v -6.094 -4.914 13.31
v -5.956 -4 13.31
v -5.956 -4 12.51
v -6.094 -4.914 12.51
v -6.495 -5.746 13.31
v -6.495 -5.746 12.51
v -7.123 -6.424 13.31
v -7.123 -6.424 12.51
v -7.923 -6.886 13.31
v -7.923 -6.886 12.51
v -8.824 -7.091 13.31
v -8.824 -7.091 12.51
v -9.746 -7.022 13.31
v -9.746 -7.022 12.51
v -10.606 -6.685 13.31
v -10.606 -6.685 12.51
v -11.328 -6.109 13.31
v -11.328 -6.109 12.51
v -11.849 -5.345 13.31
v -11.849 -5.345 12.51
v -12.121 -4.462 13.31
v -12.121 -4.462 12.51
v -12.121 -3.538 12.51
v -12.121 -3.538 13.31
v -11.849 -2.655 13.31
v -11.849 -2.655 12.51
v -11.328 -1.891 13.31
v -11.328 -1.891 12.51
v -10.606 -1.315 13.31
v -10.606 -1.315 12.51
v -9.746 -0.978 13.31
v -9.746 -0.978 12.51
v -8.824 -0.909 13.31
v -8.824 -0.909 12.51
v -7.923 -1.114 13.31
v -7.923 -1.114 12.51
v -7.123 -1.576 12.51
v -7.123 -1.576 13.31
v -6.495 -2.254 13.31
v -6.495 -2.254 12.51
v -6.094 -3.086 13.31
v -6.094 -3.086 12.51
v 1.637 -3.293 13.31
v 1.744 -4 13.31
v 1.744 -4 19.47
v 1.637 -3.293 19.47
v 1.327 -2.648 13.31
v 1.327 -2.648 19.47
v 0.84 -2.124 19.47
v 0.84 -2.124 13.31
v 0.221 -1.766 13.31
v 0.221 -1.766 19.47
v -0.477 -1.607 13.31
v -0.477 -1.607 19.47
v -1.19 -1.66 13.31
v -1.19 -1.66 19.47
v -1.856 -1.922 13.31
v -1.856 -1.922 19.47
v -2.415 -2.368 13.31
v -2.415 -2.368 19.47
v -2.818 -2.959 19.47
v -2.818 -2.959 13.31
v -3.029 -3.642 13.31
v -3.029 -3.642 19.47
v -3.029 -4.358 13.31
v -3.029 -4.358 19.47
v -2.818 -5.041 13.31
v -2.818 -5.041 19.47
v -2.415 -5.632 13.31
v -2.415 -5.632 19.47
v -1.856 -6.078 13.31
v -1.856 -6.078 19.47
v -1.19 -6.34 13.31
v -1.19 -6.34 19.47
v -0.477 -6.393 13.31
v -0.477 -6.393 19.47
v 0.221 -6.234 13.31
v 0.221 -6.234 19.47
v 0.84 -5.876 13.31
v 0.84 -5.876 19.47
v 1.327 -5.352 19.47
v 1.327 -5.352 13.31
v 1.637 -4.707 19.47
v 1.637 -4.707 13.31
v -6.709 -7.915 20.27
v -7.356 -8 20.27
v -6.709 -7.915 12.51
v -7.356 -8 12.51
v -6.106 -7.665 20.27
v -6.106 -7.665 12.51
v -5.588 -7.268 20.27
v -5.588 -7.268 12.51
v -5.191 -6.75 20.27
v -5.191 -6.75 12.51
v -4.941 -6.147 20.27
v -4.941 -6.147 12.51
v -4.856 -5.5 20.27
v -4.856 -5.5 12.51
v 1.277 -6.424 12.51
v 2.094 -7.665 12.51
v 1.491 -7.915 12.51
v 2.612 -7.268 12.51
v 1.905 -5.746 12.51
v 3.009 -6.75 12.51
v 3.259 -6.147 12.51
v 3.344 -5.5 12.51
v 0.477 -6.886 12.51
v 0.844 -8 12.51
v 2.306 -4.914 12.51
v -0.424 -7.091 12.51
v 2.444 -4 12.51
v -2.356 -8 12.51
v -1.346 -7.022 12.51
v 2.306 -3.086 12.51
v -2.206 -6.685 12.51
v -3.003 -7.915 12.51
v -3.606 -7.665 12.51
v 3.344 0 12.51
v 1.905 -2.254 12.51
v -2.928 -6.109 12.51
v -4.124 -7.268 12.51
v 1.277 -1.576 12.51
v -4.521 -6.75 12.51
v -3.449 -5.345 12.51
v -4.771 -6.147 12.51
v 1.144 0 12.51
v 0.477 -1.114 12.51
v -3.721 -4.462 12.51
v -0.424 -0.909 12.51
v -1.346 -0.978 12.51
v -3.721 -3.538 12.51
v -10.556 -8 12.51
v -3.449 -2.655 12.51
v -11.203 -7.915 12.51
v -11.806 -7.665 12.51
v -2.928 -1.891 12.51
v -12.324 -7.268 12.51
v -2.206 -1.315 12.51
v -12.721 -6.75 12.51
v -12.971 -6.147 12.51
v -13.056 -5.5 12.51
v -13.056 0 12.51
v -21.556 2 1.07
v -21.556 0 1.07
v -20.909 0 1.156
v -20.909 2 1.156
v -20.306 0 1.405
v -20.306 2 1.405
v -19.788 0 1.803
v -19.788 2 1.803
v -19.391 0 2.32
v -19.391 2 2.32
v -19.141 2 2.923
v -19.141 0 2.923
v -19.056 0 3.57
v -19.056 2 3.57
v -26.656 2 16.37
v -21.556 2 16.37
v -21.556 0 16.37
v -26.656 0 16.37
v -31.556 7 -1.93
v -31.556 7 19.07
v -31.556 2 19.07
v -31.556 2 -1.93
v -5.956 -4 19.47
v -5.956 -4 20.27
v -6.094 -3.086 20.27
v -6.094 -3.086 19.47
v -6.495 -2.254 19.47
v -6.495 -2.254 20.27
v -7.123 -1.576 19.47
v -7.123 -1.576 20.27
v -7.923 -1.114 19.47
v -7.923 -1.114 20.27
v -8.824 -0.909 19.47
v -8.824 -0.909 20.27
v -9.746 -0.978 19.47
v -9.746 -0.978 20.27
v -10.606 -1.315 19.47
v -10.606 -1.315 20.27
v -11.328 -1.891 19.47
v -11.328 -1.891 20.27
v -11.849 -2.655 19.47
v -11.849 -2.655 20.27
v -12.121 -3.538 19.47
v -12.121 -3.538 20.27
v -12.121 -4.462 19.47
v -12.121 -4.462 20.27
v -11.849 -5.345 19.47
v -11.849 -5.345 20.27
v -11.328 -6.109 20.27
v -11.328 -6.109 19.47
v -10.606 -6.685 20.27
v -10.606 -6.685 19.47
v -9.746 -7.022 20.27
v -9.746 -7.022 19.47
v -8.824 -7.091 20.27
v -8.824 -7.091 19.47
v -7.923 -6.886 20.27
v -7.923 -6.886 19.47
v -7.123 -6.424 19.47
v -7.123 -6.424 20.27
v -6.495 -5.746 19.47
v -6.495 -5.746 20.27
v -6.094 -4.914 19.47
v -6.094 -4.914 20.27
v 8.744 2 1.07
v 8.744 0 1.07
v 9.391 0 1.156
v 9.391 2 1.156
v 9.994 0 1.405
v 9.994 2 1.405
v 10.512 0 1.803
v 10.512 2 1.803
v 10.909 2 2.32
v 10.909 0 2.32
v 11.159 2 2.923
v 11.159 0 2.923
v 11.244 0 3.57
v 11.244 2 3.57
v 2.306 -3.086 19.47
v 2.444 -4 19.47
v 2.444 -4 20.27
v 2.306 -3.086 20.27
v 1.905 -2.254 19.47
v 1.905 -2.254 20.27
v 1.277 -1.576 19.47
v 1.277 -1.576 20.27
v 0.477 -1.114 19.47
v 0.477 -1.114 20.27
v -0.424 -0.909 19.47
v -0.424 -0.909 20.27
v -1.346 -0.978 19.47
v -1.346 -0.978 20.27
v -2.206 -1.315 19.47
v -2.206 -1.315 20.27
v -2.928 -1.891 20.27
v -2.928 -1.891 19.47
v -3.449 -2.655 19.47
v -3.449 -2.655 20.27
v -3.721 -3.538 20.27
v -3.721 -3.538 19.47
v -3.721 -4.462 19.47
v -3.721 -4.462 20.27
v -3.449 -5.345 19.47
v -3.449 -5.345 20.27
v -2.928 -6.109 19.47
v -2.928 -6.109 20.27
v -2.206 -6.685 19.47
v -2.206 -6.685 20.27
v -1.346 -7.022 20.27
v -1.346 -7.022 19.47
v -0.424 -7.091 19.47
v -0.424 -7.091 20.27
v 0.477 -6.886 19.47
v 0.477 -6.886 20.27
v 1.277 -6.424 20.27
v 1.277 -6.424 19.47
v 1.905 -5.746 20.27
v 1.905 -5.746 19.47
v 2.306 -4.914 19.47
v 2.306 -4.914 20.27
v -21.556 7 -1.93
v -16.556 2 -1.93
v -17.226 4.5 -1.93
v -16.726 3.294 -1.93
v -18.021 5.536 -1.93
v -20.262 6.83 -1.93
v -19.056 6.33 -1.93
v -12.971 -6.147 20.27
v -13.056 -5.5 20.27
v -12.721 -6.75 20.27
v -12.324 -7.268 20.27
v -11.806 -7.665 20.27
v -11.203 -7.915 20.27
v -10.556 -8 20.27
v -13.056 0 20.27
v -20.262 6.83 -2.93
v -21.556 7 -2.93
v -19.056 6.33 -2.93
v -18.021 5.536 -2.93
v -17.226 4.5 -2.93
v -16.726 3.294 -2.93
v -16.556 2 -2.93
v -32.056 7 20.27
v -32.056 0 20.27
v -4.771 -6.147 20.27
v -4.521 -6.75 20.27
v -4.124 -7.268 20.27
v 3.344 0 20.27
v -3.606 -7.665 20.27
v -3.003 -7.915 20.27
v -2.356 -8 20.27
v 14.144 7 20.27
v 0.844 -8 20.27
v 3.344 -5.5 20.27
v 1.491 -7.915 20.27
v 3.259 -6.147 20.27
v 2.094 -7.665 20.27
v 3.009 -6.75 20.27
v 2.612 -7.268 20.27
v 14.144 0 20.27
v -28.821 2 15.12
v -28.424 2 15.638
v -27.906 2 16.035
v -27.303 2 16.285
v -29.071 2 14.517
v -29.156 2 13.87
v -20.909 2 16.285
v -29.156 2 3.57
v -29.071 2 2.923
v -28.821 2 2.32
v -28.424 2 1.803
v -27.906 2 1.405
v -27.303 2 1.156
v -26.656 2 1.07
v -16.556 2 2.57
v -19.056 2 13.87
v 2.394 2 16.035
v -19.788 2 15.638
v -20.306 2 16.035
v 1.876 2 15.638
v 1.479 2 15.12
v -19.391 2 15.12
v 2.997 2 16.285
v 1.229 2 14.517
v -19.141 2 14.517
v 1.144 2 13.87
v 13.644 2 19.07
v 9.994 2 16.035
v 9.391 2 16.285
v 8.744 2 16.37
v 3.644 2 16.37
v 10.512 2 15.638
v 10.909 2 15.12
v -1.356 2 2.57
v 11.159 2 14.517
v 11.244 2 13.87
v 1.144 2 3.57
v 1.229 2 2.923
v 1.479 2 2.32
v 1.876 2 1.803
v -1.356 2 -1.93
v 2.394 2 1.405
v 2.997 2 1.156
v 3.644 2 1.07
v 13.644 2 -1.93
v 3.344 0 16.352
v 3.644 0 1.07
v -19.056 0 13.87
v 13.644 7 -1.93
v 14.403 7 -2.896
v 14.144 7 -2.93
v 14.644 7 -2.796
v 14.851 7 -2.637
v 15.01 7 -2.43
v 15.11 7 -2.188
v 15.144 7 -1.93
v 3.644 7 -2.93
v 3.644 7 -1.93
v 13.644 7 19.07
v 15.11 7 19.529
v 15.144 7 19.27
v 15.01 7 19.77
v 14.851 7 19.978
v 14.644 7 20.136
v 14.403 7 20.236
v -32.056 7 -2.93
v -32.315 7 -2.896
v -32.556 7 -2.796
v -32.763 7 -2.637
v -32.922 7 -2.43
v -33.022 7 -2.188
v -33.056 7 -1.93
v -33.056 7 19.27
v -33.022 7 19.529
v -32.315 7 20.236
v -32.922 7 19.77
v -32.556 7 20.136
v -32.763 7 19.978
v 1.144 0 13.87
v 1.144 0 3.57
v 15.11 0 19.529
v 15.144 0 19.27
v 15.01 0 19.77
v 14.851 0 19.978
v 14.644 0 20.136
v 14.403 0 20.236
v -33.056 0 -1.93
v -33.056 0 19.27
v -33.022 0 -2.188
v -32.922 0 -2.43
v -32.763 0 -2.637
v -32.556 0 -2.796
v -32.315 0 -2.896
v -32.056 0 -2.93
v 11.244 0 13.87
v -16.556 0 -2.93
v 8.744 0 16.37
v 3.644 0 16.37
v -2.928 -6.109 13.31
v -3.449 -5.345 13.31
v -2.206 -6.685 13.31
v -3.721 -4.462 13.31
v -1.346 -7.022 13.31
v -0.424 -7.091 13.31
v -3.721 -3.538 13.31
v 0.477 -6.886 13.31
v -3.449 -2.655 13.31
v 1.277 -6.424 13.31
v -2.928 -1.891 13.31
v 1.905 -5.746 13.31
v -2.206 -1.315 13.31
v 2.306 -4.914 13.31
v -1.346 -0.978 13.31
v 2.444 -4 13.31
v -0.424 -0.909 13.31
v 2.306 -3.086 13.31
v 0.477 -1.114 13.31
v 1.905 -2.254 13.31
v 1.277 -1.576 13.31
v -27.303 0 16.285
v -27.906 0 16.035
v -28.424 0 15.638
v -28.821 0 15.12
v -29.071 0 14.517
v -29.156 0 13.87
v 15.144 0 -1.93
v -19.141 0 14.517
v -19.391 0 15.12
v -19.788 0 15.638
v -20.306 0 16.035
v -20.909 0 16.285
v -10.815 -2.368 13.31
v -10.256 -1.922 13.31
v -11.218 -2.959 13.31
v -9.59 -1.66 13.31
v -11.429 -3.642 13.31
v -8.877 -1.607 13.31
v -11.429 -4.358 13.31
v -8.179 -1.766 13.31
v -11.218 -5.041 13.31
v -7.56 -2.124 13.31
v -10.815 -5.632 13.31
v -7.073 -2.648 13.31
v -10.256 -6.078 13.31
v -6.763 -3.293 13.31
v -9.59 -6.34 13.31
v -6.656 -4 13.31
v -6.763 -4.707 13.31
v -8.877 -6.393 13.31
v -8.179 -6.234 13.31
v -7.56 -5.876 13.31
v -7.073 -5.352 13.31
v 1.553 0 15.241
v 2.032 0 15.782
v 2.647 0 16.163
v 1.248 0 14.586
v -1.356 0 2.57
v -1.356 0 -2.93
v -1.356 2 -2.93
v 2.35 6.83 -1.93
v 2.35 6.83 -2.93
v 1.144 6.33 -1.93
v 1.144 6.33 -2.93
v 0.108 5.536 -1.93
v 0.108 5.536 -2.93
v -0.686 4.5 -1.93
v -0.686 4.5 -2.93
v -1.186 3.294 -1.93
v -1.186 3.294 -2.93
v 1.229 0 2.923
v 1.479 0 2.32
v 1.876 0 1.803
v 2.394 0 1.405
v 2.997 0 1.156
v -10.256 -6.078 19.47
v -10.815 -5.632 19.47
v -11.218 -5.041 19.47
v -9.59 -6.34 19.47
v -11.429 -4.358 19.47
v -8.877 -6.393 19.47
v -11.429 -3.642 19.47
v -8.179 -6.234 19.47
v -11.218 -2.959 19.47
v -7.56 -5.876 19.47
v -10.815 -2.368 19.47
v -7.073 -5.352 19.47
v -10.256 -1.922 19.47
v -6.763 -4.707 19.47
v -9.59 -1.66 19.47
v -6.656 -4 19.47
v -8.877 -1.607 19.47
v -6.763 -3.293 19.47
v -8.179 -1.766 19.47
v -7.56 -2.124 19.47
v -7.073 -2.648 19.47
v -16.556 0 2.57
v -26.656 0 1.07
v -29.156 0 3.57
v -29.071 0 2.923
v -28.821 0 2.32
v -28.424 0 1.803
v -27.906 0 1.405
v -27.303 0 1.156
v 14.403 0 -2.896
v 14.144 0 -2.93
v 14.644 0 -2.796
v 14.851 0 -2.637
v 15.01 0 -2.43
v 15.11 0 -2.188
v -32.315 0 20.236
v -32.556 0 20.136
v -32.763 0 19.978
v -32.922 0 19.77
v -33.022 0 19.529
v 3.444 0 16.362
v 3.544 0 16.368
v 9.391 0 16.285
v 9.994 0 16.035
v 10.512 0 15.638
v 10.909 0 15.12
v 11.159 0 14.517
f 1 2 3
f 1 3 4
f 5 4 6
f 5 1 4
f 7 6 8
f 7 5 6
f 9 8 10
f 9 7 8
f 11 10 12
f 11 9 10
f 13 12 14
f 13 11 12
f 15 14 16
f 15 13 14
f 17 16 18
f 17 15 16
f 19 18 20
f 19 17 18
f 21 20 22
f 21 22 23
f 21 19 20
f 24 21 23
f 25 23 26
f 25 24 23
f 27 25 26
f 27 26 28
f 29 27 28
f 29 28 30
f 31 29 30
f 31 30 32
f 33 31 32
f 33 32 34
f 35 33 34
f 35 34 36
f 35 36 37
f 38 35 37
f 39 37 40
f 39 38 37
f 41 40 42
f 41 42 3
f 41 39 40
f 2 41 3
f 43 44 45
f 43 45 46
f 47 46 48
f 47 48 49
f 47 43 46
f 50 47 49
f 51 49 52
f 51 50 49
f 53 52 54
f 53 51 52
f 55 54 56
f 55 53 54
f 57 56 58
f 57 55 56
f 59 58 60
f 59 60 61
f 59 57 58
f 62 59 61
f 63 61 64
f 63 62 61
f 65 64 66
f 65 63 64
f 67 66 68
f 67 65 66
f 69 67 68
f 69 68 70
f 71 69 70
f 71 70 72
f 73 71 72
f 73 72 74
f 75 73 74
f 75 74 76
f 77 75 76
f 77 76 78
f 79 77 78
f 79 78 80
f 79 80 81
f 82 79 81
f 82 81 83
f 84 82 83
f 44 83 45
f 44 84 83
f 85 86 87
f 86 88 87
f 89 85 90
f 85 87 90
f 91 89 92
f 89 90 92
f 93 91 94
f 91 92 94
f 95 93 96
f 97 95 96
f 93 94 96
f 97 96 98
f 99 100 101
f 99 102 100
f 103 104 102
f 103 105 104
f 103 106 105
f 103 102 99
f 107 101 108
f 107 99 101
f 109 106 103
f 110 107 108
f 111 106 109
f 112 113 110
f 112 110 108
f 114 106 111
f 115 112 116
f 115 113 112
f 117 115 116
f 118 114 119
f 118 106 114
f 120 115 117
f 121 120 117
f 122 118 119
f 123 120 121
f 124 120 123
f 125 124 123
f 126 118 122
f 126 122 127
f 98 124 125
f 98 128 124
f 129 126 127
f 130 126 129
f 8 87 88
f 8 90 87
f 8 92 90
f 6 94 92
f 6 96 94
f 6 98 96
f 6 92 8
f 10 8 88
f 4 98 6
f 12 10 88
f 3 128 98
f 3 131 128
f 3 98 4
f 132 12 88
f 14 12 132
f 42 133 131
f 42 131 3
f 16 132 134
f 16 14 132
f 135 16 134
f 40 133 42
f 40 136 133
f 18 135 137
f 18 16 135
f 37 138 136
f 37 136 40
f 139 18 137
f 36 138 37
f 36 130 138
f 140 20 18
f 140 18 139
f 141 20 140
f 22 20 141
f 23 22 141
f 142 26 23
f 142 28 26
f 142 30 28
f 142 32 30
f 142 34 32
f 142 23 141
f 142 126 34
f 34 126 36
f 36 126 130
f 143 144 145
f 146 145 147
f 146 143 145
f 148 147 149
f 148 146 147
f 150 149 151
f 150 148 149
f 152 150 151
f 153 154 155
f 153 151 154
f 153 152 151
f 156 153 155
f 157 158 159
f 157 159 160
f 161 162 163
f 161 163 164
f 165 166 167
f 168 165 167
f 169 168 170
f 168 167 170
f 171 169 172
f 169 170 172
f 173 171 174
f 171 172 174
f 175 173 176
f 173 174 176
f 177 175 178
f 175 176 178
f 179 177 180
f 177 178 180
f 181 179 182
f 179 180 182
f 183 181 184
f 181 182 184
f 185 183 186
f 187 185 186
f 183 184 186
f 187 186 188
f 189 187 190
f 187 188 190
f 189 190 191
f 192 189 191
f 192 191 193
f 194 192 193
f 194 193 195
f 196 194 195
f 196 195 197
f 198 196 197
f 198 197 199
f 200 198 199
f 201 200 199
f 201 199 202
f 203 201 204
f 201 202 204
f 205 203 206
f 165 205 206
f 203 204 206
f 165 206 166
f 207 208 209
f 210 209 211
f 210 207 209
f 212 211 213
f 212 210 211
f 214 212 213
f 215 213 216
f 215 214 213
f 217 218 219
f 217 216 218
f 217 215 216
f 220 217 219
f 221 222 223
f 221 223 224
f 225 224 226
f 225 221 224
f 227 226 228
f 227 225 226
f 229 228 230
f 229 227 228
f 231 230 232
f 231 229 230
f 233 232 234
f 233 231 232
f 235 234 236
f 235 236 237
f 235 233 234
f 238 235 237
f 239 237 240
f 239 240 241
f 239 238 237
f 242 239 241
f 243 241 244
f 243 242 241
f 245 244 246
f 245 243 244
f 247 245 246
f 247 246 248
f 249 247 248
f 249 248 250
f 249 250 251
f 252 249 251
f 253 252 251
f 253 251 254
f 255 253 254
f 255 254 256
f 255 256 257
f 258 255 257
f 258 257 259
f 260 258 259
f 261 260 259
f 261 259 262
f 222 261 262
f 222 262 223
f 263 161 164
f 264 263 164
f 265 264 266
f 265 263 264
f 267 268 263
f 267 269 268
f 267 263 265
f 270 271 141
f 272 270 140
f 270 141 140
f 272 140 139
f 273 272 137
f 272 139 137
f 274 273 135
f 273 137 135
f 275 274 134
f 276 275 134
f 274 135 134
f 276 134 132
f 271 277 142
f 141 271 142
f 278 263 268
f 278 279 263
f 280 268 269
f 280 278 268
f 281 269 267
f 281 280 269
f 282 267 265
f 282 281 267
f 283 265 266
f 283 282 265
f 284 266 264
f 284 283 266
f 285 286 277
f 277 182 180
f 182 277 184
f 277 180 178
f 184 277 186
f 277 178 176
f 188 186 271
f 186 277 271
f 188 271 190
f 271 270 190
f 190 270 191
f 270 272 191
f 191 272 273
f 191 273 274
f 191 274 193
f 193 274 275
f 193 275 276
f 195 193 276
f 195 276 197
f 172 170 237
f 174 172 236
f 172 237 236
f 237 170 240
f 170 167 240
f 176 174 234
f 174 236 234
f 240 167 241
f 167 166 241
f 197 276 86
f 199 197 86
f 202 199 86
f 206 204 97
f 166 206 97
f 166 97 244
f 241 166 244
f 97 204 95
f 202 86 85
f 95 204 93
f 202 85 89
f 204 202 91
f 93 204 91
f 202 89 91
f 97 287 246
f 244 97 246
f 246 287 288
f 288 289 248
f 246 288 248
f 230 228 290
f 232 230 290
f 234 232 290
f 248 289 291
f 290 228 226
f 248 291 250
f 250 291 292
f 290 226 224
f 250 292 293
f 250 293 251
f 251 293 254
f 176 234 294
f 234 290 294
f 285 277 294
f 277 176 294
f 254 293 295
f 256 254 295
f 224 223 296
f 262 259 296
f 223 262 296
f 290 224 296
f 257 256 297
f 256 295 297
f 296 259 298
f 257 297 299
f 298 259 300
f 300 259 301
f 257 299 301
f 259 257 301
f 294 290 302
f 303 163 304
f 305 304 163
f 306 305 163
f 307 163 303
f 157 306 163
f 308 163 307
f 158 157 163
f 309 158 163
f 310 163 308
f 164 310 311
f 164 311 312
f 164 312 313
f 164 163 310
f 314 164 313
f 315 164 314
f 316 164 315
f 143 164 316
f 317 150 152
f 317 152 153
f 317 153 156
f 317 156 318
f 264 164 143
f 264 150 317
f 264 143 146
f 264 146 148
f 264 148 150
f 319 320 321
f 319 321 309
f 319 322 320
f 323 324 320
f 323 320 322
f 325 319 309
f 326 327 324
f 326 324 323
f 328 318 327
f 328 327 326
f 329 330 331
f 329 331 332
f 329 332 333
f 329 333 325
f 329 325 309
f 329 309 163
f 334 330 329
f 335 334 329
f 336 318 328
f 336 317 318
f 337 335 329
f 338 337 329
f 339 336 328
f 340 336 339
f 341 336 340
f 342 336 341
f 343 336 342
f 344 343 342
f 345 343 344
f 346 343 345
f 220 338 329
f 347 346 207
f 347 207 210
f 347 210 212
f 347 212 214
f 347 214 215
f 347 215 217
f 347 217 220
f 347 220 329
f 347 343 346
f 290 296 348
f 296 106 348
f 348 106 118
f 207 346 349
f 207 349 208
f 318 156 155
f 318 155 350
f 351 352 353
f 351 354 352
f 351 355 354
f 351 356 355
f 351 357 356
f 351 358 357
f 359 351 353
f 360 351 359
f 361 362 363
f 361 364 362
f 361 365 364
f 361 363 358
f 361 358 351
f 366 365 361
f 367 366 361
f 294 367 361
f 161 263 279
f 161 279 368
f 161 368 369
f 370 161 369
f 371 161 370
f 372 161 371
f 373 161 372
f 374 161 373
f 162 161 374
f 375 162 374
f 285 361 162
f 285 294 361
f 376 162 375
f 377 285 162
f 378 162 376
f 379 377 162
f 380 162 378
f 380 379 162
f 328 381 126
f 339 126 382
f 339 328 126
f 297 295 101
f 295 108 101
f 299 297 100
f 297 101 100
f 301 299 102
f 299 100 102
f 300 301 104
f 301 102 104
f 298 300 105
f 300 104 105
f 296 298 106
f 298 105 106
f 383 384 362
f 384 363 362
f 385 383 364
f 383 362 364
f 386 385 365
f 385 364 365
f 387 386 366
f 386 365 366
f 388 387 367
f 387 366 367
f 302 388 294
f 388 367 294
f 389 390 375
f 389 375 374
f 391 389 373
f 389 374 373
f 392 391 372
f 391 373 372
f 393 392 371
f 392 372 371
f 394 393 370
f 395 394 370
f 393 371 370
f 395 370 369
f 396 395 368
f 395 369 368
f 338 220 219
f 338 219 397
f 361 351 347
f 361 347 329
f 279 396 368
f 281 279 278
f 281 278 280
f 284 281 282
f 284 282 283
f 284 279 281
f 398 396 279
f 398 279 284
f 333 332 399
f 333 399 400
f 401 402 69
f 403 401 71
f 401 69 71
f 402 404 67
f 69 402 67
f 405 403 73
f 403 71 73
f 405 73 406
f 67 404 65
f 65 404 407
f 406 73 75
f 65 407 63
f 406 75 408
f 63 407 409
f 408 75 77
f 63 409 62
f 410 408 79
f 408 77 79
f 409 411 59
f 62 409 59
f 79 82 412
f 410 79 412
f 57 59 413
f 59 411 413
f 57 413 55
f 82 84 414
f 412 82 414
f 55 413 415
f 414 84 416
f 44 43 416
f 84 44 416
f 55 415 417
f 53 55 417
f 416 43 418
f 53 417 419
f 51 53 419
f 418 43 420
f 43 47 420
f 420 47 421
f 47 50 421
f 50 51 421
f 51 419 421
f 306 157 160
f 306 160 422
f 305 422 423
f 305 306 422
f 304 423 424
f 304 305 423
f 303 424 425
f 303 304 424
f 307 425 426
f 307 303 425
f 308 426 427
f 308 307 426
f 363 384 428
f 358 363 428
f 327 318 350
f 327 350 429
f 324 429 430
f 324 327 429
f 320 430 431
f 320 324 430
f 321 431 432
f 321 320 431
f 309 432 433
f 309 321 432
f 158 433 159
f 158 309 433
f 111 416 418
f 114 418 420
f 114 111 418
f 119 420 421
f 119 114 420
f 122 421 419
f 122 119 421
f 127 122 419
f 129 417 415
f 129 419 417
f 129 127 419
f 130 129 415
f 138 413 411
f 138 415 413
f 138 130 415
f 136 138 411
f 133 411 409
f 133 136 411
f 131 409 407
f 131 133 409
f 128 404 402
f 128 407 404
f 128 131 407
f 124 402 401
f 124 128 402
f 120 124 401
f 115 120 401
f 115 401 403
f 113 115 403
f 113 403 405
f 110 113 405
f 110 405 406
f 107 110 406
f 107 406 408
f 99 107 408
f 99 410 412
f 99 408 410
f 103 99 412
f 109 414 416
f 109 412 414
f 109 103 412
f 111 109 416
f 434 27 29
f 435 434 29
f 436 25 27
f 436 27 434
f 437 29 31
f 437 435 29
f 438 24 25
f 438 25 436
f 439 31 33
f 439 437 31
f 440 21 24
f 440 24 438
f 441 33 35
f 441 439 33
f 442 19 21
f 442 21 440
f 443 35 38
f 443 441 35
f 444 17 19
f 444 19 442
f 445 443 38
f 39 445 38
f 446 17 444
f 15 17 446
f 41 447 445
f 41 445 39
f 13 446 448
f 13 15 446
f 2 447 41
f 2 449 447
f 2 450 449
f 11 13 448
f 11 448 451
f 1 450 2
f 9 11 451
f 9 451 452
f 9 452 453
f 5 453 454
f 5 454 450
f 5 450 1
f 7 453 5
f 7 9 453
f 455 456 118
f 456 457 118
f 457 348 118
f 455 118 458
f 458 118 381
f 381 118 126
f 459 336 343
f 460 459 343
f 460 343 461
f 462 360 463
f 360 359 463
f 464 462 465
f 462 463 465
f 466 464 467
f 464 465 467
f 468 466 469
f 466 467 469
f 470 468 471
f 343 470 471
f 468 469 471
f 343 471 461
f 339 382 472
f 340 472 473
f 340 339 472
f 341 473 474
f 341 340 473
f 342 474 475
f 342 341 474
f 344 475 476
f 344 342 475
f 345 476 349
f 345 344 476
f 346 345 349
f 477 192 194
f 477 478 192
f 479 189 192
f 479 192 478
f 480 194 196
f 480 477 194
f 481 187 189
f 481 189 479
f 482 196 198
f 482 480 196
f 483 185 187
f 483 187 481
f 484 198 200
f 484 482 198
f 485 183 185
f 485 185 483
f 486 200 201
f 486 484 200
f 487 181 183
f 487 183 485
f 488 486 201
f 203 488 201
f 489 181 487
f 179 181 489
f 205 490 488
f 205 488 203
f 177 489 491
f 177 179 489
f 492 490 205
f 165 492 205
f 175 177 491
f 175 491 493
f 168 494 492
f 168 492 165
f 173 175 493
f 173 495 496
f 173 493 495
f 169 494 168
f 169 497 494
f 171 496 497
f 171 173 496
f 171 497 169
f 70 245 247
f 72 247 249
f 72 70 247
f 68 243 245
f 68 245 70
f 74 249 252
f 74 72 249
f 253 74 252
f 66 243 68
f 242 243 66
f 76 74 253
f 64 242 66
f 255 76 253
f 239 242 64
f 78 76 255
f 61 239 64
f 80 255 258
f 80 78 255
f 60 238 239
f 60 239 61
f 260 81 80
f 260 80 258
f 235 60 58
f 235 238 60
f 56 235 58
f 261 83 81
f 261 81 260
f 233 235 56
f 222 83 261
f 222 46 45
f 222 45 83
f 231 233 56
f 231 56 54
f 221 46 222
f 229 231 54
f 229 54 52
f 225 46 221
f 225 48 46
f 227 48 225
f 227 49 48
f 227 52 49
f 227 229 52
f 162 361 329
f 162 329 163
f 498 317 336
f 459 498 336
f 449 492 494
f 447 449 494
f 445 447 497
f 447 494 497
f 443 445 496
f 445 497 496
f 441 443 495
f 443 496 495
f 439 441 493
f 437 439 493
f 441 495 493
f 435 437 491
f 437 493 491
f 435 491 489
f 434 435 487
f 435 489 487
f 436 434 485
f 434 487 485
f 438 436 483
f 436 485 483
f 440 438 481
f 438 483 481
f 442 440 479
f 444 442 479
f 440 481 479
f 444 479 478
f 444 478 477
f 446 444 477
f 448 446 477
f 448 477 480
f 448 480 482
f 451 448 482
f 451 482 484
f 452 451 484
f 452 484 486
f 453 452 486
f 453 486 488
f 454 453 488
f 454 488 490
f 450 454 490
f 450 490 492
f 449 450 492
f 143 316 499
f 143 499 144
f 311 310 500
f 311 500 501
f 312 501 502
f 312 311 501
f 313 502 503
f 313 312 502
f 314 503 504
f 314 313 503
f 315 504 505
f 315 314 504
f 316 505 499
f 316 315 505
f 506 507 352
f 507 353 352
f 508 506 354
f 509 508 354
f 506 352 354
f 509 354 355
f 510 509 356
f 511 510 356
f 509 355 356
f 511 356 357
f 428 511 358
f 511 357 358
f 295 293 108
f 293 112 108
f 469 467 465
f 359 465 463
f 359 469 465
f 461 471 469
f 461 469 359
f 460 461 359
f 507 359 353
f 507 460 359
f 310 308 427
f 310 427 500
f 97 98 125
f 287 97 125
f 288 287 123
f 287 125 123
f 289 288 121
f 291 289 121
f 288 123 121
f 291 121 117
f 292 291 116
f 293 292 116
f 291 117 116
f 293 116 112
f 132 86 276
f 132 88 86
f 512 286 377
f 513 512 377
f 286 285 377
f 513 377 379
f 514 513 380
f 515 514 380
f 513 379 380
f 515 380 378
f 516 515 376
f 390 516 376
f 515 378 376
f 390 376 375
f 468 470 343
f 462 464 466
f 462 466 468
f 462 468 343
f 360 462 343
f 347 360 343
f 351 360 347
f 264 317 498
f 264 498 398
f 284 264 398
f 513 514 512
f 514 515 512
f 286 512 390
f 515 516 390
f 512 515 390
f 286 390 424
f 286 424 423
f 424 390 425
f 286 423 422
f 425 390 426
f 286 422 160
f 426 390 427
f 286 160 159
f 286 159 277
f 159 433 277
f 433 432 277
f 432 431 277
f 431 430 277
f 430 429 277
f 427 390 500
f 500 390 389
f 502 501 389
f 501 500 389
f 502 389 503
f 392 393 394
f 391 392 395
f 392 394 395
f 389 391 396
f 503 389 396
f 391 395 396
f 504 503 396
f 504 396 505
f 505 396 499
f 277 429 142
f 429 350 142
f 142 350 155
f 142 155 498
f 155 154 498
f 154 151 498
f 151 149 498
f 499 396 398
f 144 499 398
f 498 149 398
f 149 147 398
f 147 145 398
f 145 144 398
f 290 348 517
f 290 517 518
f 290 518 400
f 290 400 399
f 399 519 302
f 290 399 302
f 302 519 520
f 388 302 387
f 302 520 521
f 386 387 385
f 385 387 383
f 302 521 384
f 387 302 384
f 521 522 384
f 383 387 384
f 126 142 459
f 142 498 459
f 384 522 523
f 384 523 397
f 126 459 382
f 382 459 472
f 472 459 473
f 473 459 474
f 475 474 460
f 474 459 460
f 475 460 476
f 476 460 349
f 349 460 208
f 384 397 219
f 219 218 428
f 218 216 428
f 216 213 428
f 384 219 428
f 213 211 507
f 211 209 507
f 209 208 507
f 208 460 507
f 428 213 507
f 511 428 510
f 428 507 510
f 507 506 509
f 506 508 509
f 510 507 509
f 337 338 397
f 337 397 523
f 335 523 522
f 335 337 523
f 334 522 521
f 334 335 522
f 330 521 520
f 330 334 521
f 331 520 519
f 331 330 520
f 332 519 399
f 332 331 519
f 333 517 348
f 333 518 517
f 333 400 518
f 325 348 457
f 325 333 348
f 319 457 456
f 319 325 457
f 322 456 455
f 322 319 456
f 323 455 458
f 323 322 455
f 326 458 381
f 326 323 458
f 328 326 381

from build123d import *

# Parameters (mm, degrees)
SKETCH1_W           = 48.2
SKETCH1_H           = 23.2
BOSS_EXTRUDE1_DEPTH = 10
SKETCH2_W           = 46.2
SKETCH2_H           = 21.2
CUT_EXTRUDE1_DEPTH  = 8
SKETCH3_W           = 11.2
SKETCH3_H           = 5
CUT_EXTRUDE2_DEPTH  = 10
SKETCH4_W           = 48.2
SKETCH4_H           = 23.2
CUT_EXTRUDE3_DEPTH  = 3
SKETCH5_W           = 8.2
SKETCH5_H           = 7.76
BOSS_EXTRUDE2_DEPTH = 8
SKETCH6_R           = 3.1
CUT_EXTRUDE4_DEPTH  = 0.8
SKETCH7_R           = 2.4
CUT_EXTRUDE5_DEPTH  = 10
SKETCH8_W           = 46.2
SKETCH8_H           = 20.3
CUT_EXTRUDE6_DEPTH  = 5
SKETCH9_W           = 45.4
SKETCH9_H           = 20.3
CUT_EXTRUDE8_DEPTH  = 5
CUT_EXTRUDE9_START  = -0.8
SKETCH10_R          = 3.1
CUT_EXTRUDE9_DEPTH  = 0.8
SKETCH11_W          = 15.2
SKETCH11_H          = 5.5
CUT_EXTRUDE10_DEPTH = 10
CUT_EXTRUDE11_DEPTH = 10
FILLET1_R           = 1
FILLET2_R           = 1
FILLET3_R           = 1
FILLET4_R           = 1
FILLET5_R           = 2.5
FILLET6_R           = 2.5
FILLET7_R           = 5
FILLET8_R           = 5
SKETCH13_W          = 21.2
SKETCH13_H          = 5
BOSS_EXTRUDE3_DEPTH = 0.5
SKETCH14_W          = 21.2
SKETCH14_H          = 5
BOSS_EXTRUDE4_DEPTH = 0.5
SKETCH16_W          = 45.2
SKETCH16_H          = 5
BOSS_EXTRUDE5_DEPTH = 0.2
MIRROR4_START       = 13.310407833
MIRROR4_OUTLINE_R   = 2.4
MIRROR4_DEPTH       = 6.16
MIRROR4_START_2     = 12.510407833
MIRROR4_2_OUTLINE_R = 3.1
MIRROR4_2_DEPTH     = 7.76


# Read off the part's stored shape, not the designer's step: Mirror4
with BuildPart() as part:
    # Sketch1 → Boss-Extrude1 (new body)
    with BuildSketch(Plane(origin=(0, 0, 0), x_dir=(1, 0, 0), z_dir=(0, 1, 0))):
        with Locations((-8.956036835, -8.670407833)):
            Rectangle(SKETCH1_W, SKETCH1_H)
    extrude(amount=BOSS_EXTRUDE1_DEPTH)

    # Sketch2 → Cut-Extrude1 (cut)
    with BuildSketch(Plane(origin=(0, 10, 0), x_dir=(1, 0, 0), z_dir=(0, 1, 0))):
        with Locations((-8.956036835, -8.670407833)):
            Rectangle(SKETCH2_W, SKETCH2_H)
    extrude(amount=-CUT_EXTRUDE1_DEPTH, mode=Mode.SUBTRACT)

    # Sketch3 → Cut-Extrude2 (cut)
    with BuildSketch(Plane(origin=(0, 10, 0), x_dir=(1, 0, 0), z_dir=(0, 1, 0))):
        with Locations((-8.956036835, 0.429592167)):
            Rectangle(SKETCH3_W, SKETCH3_H)
    extrude(amount=-CUT_EXTRUDE2_DEPTH, mode=Mode.SUBTRACT)

    # Sketch4 → Cut-Extrude3 (cut)
    with BuildSketch(Plane(origin=(0, 10, 0), x_dir=(1, 0, 0), z_dir=(0, 1, 0))):
        with Locations((-8.956036835, -8.670407833)):
            Rectangle(SKETCH4_W, SKETCH4_H)
    extrude(amount=-CUT_EXTRUDE3_DEPTH, mode=Mode.SUBTRACT)

    # Sketch5 → Boss-Extrude2 (add)
    with BuildSketch(Plane(origin=(0, 0, 0), x_dir=(-1, 0, 0), z_dir=(0, -1, 0))):
        with Locations((8.956036835, -16.390407833)):
            Rectangle(SKETCH5_W, SKETCH5_H)
    extrude(amount=BOSS_EXTRUDE2_DEPTH)

    # Sketch6 → Cut-Extrude4 (cut)
    with BuildSketch(Plane.XY.offset(20.270407833)):
        with Locations((-9.056036835, -4)):
            Circle(SKETCH6_R)
    extrude(amount=-CUT_EXTRUDE4_DEPTH, mode=Mode.SUBTRACT)

    # Sketch7 → Cut-Extrude5 (cut)
    with BuildSketch(Plane.XY.offset(19.470407833)):
        with Locations((-9.056036835, -4)):
            Circle(SKETCH7_R)
    extrude(amount=-CUT_EXTRUDE5_DEPTH, mode=Mode.SUBTRACT)

    # Sketch8 → Cut-Extrude6 (cut)
    with BuildSketch(Plane(origin=(0, 7, 0), x_dir=(1, 0, 0), z_dir=(0, 1, 0))):
        with Locations((-8.956036835, -8.720407833)):
            Rectangle(SKETCH8_W, SKETCH8_H)
    extrude(amount=-CUT_EXTRUDE6_DEPTH, mode=Mode.SUBTRACT)

    # Sketch9 → Cut-Extrude8 (cut)
    with BuildSketch(Plane(origin=(0, 7, 0), x_dir=(1, 0, 0), z_dir=(0, 1, 0))):
        with Locations((-8.956036835, -8.720407833)):
            Rectangle(SKETCH9_W, SKETCH9_H)
    extrude(amount=-CUT_EXTRUDE8_DEPTH, mode=Mode.SUBTRACT)

    # Sketch10 → Cut-Extrude9 (cut)
    with BuildSketch(Plane(origin=(0, 0, 12.510407833), x_dir=(-1, 0, 0), z_dir=(0, 0, -1)).offset(CUT_EXTRUDE9_START)):
        with Locations(Location((9.056036835, -4, 0), (0, 0, 180))):
            Circle(SKETCH10_R)
    extrude(amount=CUT_EXTRUDE9_DEPTH, mode=Mode.SUBTRACT)

    # Sketch11 → Cut-Extrude10 (cut)
    with BuildSketch(Plane(origin=(0, 7, 0), x_dir=(1, 0, 0), z_dir=(0, 1, 0))):
        with Locations((-8.956036835, 0.179592167)):
            Rectangle(SKETCH11_W, SKETCH11_H)
    extrude(amount=-CUT_EXTRUDE10_DEPTH, mode=Mode.SUBTRACT)

    # Sketch12 → Cut-Extrude11 (cut)
    with BuildSketch(Plane(origin=(0, 2, 0), x_dir=(1, 0, 0), z_dir=(0, 1, 0))):
        with BuildLine():
            Line((8.743963165, -16.370407833), (3.643963165, -16.370407833))
            ThreePointArc((3.643963165, -16.370407833), (1.876196212, -15.638174786), (1.143963165, -13.870407833))
            Line((1.143963165, -13.870407833), (1.143963165, -3.570407833))
            ThreePointArc((1.143963165, -3.570407833), (1.876196212, -1.80264088), (3.643963165, -1.070407833))
            Line((3.643963165, -1.070407833), (8.743963165, -1.070407833))
            ThreePointArc((8.743963165, -1.070407833), (10.511730118, -1.80264088), (11.243963165, -3.570407833))
            Line((11.243963165, -3.570407833), (11.243963165, -13.870407833))
            ThreePointArc((11.243963165, -13.870407833), (10.511730118, -15.638174786), (8.743963165, -16.370407833))
        make_face()
        with BuildLine():
            Line((-21.556036835, -16.370407833), (-26.656036835, -16.370407833))
            ThreePointArc((-26.656036835, -16.370407833), (-28.423803788, -15.638174786), (-29.156036835, -13.870407833))
            Line((-29.156036835, -13.870407833), (-29.156036835, -3.570407833))
            ThreePointArc((-29.156036835, -3.570407833), (-28.423803788, -1.80264088), (-26.656036835, -1.070407833))
            Line((-26.656036835, -1.070407833), (-21.556036835, -1.070407833))
            ThreePointArc((-21.556036835, -1.070407833), (-19.788269882, -1.80264088), (-19.056036835, -3.570407833))
            Line((-19.056036835, -3.570407833), (-19.056036835, -13.870407833))
            ThreePointArc((-19.056036835, -13.870407833), (-19.788269882, -15.638174786), (-21.556036835, -16.370407833))
        make_face()
    extrude(amount=-CUT_EXTRUDE11_DEPTH, mode=Mode.SUBTRACT)

    # Fillet1
    fillet1_edges = [part.edges().sort_by_distance(p)[0] for p in [
        (15.143963165, 3.5, -2.929592167),
    ]]
    fillet(fillet1_edges, radius=FILLET1_R)

    # Fillet2
    fillet2_edges = [part.edges().sort_by_distance(p)[0] for p in [
        (15.143963165, 3.5, 20.270407833),
    ]]
    fillet(fillet2_edges, radius=FILLET2_R)

    # Fillet3
    fillet3_edges = [part.edges().sort_by_distance(p)[0] for p in [
        (-33.056036835, 3.5, 20.270407833),
    ]]
    fillet(fillet3_edges, radius=FILLET3_R)

    # Fillet4
    fillet4_edges = [part.edges().sort_by_distance(p)[0] for p in [
        (-33.056036835, 3.5, -2.929592167),
    ]]
    fillet(fillet4_edges, radius=FILLET4_R)

    # Fillet5
    fillet5_edges = [part.edges().sort_by_distance(p)[0] for p in [
        (-13.056036835, -8, 16.390407833),
    ]]
    fillet(fillet5_edges, radius=FILLET5_R)

    # Fillet6
    fillet6_edges = [part.edges().sort_by_distance(p)[0] for p in [
        (-4.856036835, -8, 16.390407833),
    ]]
    fillet(fillet6_edges, radius=FILLET6_R)

    # Fillet7
    fillet7_edges = [part.edges().sort_by_distance(p)[0] for p in [
        (-1.356036835, 7, -2.429592167),
    ]]
    fillet(fillet7_edges, radius=FILLET7_R)

    # Fillet8
    fillet8_edges = [part.edges().sort_by_distance(p)[0] for p in [
        (-16.556036835, 7, -2.429592167),
    ]]
    fillet(fillet8_edges, radius=FILLET8_R)

    # Sketch13 → Boss-Extrude3 (add)
    with BuildSketch(Plane.ZY.offset(-14.143963165)):
        with Locations((8.670407833, 4.5)):
            Rectangle(SKETCH13_W, SKETCH13_H)
    extrude(amount=BOSS_EXTRUDE3_DEPTH)

    # Sketch14 → Boss-Extrude4 (add)
    with BuildSketch(Plane(origin=(-32.056036835, 0, 0), x_dir=(0, 0, -1), z_dir=(1, 0, 0))):
        with Locations((-8.670407833, 4.5)):
            Rectangle(SKETCH14_W, SKETCH14_H)
    extrude(amount=BOSS_EXTRUDE4_DEPTH)

    # Sketch16 → Boss-Extrude5 (add)
    with BuildSketch(Plane(origin=(0, 0, 19.270407833), x_dir=(-1, 0, 0), z_dir=(0, 0, -1))):
        with Locations((8.956036835, 4.5)):
            Rectangle(SKETCH16_W, SKETCH16_H)
    extrude(amount=BOSS_EXTRUDE5_DEPTH)

    # Mirror4 outline → Mirror4 (add)
    with BuildSketch(Plane.XY.offset(MIRROR4_START)):
        with BuildLine():
            ThreePointArc((-4.856036835, -5.5), (-4.123803788, -7.267766953), (-2.356036835, -8))
            Line((-2.356036835, -8), (0.843963165, -8))
            ThreePointArc((0.843963165, -8), (2.611730118, -7.267766953), (3.343963165, -5.5))
            Line((3.343963165, -5.5), (3.343963165, 0))
            Line((3.343963165, 0), (-4.856036835, 0))
            Line((-4.856036835, 0), (-4.856036835, -5.5))
        make_face()
        with Locations((-0.656036835, -4)):
            Circle(MIRROR4_OUTLINE_R, mode=Mode.SUBTRACT)
    extrude(amount=MIRROR4_DEPTH)

    # Mirror4 2 outline → Mirror4 2 (add)
    with BuildSketch(Plane.XY.offset(MIRROR4_START_2)):
        with BuildLine():
            ThreePointArc((-4.856036835, -5.5), (-4.123803788, -7.267766953), (-2.356036835, -8))
            Line((-2.356036835, -8), (0.843963165, -8))
            ThreePointArc((0.843963165, -8), (2.611730118, -7.267766953), (3.343963165, -5.5))
            Line((3.343963165, -5.5), (3.343963165, 0))
            Line((3.343963165, 0), (-4.856036835, 0))
            Line((-4.856036835, 0), (-4.856036835, -5.5))
        make_face()
        with Locations((-0.656036835, -4)):
            Circle(MIRROR4_2_OUTLINE_R, mode=Mode.SUBTRACT)
    extrude(amount=MIRROR4_2_DEPTH)


solid = part.part
